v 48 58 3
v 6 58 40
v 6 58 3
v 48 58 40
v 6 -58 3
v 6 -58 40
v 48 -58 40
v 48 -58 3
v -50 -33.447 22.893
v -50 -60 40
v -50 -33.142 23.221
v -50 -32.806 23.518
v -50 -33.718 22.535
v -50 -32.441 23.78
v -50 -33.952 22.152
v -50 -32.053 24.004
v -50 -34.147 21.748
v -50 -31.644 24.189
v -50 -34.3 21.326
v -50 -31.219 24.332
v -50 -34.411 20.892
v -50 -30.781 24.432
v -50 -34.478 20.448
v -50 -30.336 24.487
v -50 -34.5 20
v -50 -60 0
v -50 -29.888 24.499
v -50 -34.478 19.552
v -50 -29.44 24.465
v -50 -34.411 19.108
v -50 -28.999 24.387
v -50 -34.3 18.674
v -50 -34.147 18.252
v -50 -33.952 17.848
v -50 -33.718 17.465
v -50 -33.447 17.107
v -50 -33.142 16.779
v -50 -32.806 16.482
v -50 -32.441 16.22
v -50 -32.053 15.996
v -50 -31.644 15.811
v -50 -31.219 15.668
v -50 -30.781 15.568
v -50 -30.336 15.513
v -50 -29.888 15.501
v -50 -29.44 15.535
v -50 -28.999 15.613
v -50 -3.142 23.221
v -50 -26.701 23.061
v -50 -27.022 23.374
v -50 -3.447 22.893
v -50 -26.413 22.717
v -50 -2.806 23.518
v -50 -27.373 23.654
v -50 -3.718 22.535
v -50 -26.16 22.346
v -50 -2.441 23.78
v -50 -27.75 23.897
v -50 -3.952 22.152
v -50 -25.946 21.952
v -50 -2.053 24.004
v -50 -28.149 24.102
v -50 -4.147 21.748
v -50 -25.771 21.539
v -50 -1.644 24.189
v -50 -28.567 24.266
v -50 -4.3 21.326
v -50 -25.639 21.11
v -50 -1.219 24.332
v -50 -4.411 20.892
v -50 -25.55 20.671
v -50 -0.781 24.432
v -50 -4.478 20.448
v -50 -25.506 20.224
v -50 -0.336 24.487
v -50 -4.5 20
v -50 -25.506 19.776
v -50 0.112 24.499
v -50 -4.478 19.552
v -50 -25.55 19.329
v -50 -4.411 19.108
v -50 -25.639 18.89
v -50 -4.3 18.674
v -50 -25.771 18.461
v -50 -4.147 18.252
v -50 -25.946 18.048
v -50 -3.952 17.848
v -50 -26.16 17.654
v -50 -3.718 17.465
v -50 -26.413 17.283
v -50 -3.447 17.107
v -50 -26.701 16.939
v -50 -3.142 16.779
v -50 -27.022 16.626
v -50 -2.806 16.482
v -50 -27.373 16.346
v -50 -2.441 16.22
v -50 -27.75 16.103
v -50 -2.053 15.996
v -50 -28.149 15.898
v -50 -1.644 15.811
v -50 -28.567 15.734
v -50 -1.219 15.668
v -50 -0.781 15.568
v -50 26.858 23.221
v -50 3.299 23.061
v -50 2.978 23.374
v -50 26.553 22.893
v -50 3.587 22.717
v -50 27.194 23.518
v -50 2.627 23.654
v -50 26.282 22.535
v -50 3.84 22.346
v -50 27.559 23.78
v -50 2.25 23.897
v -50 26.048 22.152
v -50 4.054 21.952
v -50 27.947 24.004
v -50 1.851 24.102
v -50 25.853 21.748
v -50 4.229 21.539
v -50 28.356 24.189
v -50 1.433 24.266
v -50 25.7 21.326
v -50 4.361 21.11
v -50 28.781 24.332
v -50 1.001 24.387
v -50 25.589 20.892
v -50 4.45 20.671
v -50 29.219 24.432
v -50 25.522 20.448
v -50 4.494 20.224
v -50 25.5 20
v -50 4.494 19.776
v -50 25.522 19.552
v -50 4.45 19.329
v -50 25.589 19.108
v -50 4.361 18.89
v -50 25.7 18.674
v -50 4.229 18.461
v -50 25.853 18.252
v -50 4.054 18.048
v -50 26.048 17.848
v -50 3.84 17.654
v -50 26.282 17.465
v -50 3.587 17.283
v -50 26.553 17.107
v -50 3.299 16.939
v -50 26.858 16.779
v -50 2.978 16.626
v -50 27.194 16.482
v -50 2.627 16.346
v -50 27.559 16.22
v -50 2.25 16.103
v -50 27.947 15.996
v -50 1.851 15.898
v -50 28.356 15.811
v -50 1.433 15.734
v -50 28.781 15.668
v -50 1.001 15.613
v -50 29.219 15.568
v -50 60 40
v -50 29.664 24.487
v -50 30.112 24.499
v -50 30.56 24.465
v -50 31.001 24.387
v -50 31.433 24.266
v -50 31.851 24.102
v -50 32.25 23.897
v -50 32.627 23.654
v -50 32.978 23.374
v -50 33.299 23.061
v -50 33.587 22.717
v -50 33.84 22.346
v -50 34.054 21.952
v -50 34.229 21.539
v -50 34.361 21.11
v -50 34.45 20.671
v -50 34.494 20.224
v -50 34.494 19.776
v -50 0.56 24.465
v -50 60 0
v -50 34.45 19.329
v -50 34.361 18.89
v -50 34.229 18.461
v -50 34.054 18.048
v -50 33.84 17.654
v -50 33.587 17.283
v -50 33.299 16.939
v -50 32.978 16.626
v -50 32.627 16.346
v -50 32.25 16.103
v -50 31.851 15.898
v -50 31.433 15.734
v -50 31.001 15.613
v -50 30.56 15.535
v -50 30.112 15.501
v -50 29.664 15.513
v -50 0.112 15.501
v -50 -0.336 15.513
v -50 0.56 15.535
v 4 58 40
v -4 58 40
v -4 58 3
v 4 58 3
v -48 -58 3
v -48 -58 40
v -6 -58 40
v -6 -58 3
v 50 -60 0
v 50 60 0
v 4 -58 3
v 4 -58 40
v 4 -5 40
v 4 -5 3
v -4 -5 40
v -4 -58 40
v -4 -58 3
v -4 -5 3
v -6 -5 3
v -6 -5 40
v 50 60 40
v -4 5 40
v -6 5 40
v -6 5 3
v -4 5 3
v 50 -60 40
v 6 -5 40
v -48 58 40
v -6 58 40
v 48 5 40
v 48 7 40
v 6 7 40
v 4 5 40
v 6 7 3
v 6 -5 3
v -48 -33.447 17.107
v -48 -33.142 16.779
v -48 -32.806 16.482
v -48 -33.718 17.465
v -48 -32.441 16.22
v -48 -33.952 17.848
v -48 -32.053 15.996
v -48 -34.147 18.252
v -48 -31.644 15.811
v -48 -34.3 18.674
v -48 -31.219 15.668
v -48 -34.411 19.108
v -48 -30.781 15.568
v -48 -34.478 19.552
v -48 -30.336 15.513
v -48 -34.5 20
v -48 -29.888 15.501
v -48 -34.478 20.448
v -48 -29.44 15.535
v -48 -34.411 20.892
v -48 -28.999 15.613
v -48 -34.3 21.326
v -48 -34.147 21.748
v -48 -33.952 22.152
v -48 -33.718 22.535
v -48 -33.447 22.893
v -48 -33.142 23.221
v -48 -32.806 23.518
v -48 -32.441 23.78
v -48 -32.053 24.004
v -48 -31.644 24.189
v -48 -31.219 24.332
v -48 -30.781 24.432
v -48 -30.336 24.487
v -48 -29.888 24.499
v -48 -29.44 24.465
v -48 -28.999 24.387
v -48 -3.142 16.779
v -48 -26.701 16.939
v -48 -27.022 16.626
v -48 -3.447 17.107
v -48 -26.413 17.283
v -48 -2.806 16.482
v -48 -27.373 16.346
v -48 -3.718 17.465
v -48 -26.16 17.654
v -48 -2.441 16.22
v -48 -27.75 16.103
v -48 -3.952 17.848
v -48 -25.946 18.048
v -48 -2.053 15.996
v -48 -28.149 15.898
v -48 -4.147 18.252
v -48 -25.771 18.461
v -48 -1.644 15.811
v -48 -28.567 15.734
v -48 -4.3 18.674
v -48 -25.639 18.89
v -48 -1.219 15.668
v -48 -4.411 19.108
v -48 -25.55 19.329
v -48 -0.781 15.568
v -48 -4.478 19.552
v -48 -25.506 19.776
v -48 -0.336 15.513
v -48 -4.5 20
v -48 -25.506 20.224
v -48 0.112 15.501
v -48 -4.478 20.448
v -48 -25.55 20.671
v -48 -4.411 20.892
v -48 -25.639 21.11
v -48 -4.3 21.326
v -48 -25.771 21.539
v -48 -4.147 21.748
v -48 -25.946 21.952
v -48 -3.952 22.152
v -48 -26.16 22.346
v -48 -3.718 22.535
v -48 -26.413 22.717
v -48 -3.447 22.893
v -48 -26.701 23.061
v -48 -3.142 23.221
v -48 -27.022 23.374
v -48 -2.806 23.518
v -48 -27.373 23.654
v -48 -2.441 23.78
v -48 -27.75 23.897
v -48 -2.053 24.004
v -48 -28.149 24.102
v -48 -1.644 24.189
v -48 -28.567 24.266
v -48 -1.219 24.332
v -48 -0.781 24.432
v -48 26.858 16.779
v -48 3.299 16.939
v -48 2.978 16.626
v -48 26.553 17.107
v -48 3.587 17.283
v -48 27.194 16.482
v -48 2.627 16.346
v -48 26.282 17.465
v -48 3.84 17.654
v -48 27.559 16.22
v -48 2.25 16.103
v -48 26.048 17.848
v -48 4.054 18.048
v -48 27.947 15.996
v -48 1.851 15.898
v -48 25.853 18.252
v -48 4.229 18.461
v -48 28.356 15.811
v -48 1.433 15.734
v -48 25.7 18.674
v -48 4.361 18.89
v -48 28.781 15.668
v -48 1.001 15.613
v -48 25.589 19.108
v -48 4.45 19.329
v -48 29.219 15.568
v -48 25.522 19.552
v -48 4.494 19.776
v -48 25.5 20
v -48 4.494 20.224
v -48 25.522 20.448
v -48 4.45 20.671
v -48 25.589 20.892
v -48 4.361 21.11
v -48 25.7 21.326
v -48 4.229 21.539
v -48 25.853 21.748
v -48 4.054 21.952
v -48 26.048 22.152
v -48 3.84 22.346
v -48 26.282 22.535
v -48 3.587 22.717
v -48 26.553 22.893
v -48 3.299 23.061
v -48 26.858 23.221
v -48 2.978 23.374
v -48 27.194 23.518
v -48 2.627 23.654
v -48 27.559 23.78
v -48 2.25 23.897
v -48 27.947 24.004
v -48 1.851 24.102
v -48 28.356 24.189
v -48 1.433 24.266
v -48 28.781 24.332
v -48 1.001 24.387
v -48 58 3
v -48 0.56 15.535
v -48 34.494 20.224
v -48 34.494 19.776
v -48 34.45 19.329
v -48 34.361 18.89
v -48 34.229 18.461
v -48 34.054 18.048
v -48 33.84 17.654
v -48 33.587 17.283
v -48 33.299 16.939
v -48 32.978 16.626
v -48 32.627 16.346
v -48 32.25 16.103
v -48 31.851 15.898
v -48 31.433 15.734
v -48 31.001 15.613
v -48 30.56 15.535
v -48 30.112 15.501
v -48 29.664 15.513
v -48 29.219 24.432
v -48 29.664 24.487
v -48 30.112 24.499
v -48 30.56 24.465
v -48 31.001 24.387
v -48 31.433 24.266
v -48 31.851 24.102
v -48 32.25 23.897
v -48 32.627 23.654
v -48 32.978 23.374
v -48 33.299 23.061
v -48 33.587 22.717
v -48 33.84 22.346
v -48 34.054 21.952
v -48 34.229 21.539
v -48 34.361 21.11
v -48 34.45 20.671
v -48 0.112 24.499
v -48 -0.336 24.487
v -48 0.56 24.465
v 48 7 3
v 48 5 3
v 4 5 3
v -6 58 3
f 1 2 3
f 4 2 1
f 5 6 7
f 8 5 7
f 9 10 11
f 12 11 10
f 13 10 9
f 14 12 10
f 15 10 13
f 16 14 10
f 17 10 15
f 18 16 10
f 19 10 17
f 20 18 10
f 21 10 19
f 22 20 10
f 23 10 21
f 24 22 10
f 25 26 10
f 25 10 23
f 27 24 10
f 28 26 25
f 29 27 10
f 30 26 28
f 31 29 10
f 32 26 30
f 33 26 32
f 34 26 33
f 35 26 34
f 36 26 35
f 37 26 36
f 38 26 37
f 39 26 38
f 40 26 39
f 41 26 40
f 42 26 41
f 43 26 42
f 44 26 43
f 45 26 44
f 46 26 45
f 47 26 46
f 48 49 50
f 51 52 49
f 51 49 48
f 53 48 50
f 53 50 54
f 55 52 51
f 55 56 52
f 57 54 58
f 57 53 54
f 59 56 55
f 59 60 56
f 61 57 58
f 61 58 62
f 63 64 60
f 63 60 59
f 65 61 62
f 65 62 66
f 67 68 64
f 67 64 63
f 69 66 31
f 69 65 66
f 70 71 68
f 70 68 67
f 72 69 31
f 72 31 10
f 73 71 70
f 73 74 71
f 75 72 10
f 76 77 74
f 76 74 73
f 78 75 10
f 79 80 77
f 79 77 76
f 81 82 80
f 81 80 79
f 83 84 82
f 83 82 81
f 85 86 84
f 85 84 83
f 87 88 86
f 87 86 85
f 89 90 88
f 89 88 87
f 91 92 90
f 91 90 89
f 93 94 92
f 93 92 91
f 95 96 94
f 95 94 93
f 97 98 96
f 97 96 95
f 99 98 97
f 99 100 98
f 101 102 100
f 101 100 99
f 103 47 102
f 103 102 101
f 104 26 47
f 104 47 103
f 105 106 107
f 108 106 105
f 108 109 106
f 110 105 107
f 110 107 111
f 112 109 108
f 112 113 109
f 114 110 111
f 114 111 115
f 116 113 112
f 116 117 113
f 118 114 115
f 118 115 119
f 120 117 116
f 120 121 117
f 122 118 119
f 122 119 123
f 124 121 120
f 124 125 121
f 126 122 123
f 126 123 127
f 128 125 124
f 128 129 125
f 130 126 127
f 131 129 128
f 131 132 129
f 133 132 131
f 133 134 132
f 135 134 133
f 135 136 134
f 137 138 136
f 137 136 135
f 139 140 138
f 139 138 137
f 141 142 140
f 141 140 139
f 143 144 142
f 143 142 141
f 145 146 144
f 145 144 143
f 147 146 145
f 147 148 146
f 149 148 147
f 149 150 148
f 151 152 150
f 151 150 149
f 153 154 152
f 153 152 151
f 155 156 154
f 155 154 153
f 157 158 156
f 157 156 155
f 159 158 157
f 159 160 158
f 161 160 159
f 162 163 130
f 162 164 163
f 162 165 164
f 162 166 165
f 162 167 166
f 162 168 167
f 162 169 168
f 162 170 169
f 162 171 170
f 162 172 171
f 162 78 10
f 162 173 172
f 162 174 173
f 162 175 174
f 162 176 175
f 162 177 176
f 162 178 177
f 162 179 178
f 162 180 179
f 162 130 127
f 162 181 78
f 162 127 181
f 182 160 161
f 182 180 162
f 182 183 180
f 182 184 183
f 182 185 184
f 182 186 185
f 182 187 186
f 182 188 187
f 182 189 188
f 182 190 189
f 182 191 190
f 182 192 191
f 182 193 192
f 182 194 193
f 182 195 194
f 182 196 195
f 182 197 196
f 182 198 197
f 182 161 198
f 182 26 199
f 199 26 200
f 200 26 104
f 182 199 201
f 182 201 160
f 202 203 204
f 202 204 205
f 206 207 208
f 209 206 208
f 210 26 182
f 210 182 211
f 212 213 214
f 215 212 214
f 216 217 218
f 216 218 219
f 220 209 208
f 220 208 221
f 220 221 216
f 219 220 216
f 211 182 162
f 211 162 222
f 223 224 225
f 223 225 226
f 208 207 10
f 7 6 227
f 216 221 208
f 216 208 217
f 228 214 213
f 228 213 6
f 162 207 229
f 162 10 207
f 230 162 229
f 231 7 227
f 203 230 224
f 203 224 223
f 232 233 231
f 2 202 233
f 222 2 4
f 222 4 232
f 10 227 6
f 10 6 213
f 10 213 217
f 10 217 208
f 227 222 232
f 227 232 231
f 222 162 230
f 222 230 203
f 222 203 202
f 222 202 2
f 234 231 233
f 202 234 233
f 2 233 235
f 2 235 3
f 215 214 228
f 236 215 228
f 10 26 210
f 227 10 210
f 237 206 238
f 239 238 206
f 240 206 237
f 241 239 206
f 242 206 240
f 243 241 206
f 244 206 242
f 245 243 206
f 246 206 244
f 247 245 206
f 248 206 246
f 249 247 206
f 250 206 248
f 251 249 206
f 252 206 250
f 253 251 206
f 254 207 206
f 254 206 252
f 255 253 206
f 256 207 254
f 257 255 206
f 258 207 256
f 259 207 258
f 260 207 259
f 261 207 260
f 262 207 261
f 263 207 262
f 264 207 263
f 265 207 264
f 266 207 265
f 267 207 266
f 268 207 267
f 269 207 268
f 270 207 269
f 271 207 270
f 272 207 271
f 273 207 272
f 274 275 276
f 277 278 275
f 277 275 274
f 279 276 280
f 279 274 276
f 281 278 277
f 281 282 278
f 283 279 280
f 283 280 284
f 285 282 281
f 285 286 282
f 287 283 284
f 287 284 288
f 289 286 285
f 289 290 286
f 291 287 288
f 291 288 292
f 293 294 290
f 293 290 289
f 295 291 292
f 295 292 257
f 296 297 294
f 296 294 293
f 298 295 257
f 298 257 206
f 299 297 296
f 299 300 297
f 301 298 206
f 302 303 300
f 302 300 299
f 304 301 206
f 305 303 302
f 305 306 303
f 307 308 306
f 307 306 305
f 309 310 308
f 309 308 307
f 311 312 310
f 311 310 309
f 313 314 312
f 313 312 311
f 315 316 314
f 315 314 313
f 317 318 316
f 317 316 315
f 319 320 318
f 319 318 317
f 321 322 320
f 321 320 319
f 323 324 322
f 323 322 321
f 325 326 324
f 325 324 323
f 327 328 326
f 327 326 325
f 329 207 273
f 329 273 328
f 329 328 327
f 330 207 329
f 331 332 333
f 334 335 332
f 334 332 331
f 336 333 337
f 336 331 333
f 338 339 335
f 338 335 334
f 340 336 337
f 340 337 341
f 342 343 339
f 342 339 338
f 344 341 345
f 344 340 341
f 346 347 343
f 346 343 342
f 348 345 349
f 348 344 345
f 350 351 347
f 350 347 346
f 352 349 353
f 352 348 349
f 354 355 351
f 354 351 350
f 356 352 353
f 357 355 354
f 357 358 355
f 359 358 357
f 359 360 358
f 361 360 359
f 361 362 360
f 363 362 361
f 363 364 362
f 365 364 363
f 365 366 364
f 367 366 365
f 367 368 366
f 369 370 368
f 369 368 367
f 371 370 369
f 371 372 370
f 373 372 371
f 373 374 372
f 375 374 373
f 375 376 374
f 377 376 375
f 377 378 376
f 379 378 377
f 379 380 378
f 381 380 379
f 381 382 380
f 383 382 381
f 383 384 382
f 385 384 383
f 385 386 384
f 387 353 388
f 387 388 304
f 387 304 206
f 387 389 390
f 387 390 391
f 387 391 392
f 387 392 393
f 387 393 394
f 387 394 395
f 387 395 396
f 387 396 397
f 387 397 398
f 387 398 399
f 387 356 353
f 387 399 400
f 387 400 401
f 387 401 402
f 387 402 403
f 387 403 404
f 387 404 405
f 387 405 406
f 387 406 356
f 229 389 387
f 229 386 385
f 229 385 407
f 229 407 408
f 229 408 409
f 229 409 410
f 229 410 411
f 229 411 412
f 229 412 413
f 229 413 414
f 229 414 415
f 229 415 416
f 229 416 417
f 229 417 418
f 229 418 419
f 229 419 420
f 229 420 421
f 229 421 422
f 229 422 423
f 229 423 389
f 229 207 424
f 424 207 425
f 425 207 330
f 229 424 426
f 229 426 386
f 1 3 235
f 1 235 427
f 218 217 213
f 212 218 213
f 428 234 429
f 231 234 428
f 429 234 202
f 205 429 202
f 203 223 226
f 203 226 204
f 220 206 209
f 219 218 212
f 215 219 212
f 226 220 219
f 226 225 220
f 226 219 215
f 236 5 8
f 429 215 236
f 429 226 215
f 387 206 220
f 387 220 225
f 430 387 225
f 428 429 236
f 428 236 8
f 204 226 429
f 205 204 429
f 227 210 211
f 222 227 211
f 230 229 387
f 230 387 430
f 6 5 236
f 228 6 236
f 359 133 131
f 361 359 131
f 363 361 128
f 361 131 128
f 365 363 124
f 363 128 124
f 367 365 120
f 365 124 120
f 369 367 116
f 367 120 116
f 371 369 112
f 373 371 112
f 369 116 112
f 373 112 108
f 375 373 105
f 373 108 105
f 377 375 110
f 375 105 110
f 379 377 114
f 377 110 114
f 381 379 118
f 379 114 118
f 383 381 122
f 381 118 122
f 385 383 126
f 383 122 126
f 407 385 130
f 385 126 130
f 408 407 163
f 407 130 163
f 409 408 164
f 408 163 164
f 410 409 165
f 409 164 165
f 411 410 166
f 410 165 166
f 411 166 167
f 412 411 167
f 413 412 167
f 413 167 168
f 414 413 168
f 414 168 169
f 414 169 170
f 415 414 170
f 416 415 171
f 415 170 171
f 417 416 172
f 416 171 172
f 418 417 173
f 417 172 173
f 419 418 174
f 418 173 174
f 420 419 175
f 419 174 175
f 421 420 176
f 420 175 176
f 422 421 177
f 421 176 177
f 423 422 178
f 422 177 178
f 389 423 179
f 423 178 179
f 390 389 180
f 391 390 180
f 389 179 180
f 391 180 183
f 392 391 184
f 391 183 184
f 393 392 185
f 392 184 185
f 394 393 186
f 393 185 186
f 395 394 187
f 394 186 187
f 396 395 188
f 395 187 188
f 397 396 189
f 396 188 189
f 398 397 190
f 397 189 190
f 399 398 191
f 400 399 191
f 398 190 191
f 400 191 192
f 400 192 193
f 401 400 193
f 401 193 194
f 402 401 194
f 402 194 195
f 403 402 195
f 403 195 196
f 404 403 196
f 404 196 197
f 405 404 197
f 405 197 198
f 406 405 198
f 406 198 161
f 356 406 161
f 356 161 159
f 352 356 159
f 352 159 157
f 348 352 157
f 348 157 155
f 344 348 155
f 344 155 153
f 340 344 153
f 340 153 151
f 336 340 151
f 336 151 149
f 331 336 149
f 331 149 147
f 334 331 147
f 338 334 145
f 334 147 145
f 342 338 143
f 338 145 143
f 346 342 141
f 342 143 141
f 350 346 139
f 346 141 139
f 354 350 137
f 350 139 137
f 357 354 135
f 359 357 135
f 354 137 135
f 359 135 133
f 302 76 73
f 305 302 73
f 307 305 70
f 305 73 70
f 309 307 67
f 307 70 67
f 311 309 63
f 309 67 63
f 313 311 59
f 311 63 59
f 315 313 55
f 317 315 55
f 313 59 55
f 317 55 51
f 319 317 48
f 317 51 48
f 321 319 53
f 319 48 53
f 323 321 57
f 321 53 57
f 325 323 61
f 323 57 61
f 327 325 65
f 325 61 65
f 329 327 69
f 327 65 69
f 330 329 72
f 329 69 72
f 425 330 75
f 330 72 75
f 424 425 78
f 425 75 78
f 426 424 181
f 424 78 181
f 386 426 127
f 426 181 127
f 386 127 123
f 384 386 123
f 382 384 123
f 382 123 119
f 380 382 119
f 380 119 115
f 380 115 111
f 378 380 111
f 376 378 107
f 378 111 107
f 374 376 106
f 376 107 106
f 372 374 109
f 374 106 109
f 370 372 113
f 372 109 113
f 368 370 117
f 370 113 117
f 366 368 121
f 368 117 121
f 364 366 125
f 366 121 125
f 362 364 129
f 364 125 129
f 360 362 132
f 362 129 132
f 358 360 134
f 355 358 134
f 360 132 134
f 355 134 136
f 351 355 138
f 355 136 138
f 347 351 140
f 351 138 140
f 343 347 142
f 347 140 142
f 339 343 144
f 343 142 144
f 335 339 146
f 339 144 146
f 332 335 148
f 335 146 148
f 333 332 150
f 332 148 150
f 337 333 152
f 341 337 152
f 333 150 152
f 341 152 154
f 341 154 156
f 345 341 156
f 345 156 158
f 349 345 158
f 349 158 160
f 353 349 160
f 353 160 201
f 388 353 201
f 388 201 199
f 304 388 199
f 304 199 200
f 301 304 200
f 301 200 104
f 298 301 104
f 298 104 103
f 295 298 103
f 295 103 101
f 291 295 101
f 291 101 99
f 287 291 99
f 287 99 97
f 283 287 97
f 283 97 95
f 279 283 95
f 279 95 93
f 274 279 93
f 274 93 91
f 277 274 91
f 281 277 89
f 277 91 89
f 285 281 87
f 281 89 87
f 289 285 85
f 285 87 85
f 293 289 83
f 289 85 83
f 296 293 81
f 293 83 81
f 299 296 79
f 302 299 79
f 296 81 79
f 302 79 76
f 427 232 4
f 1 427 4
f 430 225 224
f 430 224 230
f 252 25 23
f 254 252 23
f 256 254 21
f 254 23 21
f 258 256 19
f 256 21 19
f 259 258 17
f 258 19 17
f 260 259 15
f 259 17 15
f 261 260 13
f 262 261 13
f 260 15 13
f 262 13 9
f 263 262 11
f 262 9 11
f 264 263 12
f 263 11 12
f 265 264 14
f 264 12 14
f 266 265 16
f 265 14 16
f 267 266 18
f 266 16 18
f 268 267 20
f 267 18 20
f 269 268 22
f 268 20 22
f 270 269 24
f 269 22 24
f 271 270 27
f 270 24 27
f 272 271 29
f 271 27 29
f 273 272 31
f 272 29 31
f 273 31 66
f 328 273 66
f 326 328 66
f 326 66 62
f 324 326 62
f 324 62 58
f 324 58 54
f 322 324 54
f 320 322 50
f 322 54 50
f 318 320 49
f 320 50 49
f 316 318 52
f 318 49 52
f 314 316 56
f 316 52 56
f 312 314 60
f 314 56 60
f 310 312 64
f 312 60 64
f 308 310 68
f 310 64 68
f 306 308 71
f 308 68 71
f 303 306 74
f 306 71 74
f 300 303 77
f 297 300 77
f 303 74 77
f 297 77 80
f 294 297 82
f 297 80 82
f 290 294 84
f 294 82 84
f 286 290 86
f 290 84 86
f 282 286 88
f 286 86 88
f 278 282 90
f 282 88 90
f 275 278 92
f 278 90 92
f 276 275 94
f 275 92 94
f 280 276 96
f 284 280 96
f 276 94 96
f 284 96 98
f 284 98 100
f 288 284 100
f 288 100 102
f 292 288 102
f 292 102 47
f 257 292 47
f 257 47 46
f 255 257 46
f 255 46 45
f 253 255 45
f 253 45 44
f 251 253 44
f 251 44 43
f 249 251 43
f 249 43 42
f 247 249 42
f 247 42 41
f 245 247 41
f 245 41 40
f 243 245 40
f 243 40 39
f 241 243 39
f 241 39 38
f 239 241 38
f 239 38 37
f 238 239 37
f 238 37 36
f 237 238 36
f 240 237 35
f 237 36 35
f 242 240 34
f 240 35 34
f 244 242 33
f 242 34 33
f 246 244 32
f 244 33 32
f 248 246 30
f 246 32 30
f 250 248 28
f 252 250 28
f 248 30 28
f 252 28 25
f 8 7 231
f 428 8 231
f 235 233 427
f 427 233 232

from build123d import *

# Parameters (mm, degrees)
F0_W      = 100
F0_H      = 120
F1_DEPTH  = 40
F2_W      = 96
F2_H      = 116
F3_DEPTH  = 37
F4_R      = 4.5
F5_DEPTH  = 2
F6_W      = 12
F6_H      = 116
F7_DEPTH  = 37
F8_W      = 8
F8_H      = 116
F9_DEPTH  = 37
F10_W     = 12
F10_H     = 10
F11_DEPTH = 37
F12_W     = 42
F12_H     = 53
F13_DEPTH = 37
F14_W     = 42
F14_H     = 51
F15_DEPTH = 37


with BuildPart() as f1:
    # F0 (on Top) → F1 (new body)
    with BuildSketch(Plane.XY):
        Rectangle(F0_W, F0_H)
    extrude(amount=F1_DEPTH)

    # F2 (on face) → F3 (cut)
    with BuildSketch(Plane.XY.offset(40)):
        Rectangle(F2_W, F2_H)
    extrude(amount=-F3_DEPTH, mode=Mode.SUBTRACT)

    # F4 (on face) → F5 (cut)
    with BuildSketch(Plane(origin=(-50, 0, 0), x_dir=(0, -1, 0), z_dir=(-1, 0, 0))):
        with Locations((0, 20)):
            Circle(F4_R)
        with Locations((-30, 20)):
            Circle(F4_R)
        with Locations((30, 20)):
            Circle(F4_R)
    extrude(amount=-F5_DEPTH, mode=Mode.SUBTRACT)

    # F6 (on face) → F7 (join)
    with BuildSketch(Plane.XY.offset(3)):
        Rectangle(F6_W, F6_H)
    extrude(amount=F7_DEPTH)

    # F8 (on face) → F9 (cut)
    with BuildSketch(Plane.XY.offset(40)):
        Rectangle(F8_W, F8_H)
    extrude(amount=-F9_DEPTH, mode=Mode.SUBTRACT)

    # F10 (on face) → F11 (cut)
    with BuildSketch(Plane.XY.offset(40)):
        Rectangle(F10_W, F10_H)
    extrude(amount=-F11_DEPTH, mode=Mode.SUBTRACT)

    # F12 (on face) → F13 (join)
    with BuildSketch(Plane.XY.offset(40)):
        with Locations((27, 31.5)):
            Rectangle(F12_W, F12_H)
    extrude(amount=-F13_DEPTH)

    # F14 (on face) → F15 (cut)
    with BuildSketch(Plane.XY.offset(40)):
        with Locations((27, 32.5)):
            Rectangle(F14_W, F14_H)
    extrude(amount=-F15_DEPTH, mode=Mode.SUBTRACT)


solid = f1.part
